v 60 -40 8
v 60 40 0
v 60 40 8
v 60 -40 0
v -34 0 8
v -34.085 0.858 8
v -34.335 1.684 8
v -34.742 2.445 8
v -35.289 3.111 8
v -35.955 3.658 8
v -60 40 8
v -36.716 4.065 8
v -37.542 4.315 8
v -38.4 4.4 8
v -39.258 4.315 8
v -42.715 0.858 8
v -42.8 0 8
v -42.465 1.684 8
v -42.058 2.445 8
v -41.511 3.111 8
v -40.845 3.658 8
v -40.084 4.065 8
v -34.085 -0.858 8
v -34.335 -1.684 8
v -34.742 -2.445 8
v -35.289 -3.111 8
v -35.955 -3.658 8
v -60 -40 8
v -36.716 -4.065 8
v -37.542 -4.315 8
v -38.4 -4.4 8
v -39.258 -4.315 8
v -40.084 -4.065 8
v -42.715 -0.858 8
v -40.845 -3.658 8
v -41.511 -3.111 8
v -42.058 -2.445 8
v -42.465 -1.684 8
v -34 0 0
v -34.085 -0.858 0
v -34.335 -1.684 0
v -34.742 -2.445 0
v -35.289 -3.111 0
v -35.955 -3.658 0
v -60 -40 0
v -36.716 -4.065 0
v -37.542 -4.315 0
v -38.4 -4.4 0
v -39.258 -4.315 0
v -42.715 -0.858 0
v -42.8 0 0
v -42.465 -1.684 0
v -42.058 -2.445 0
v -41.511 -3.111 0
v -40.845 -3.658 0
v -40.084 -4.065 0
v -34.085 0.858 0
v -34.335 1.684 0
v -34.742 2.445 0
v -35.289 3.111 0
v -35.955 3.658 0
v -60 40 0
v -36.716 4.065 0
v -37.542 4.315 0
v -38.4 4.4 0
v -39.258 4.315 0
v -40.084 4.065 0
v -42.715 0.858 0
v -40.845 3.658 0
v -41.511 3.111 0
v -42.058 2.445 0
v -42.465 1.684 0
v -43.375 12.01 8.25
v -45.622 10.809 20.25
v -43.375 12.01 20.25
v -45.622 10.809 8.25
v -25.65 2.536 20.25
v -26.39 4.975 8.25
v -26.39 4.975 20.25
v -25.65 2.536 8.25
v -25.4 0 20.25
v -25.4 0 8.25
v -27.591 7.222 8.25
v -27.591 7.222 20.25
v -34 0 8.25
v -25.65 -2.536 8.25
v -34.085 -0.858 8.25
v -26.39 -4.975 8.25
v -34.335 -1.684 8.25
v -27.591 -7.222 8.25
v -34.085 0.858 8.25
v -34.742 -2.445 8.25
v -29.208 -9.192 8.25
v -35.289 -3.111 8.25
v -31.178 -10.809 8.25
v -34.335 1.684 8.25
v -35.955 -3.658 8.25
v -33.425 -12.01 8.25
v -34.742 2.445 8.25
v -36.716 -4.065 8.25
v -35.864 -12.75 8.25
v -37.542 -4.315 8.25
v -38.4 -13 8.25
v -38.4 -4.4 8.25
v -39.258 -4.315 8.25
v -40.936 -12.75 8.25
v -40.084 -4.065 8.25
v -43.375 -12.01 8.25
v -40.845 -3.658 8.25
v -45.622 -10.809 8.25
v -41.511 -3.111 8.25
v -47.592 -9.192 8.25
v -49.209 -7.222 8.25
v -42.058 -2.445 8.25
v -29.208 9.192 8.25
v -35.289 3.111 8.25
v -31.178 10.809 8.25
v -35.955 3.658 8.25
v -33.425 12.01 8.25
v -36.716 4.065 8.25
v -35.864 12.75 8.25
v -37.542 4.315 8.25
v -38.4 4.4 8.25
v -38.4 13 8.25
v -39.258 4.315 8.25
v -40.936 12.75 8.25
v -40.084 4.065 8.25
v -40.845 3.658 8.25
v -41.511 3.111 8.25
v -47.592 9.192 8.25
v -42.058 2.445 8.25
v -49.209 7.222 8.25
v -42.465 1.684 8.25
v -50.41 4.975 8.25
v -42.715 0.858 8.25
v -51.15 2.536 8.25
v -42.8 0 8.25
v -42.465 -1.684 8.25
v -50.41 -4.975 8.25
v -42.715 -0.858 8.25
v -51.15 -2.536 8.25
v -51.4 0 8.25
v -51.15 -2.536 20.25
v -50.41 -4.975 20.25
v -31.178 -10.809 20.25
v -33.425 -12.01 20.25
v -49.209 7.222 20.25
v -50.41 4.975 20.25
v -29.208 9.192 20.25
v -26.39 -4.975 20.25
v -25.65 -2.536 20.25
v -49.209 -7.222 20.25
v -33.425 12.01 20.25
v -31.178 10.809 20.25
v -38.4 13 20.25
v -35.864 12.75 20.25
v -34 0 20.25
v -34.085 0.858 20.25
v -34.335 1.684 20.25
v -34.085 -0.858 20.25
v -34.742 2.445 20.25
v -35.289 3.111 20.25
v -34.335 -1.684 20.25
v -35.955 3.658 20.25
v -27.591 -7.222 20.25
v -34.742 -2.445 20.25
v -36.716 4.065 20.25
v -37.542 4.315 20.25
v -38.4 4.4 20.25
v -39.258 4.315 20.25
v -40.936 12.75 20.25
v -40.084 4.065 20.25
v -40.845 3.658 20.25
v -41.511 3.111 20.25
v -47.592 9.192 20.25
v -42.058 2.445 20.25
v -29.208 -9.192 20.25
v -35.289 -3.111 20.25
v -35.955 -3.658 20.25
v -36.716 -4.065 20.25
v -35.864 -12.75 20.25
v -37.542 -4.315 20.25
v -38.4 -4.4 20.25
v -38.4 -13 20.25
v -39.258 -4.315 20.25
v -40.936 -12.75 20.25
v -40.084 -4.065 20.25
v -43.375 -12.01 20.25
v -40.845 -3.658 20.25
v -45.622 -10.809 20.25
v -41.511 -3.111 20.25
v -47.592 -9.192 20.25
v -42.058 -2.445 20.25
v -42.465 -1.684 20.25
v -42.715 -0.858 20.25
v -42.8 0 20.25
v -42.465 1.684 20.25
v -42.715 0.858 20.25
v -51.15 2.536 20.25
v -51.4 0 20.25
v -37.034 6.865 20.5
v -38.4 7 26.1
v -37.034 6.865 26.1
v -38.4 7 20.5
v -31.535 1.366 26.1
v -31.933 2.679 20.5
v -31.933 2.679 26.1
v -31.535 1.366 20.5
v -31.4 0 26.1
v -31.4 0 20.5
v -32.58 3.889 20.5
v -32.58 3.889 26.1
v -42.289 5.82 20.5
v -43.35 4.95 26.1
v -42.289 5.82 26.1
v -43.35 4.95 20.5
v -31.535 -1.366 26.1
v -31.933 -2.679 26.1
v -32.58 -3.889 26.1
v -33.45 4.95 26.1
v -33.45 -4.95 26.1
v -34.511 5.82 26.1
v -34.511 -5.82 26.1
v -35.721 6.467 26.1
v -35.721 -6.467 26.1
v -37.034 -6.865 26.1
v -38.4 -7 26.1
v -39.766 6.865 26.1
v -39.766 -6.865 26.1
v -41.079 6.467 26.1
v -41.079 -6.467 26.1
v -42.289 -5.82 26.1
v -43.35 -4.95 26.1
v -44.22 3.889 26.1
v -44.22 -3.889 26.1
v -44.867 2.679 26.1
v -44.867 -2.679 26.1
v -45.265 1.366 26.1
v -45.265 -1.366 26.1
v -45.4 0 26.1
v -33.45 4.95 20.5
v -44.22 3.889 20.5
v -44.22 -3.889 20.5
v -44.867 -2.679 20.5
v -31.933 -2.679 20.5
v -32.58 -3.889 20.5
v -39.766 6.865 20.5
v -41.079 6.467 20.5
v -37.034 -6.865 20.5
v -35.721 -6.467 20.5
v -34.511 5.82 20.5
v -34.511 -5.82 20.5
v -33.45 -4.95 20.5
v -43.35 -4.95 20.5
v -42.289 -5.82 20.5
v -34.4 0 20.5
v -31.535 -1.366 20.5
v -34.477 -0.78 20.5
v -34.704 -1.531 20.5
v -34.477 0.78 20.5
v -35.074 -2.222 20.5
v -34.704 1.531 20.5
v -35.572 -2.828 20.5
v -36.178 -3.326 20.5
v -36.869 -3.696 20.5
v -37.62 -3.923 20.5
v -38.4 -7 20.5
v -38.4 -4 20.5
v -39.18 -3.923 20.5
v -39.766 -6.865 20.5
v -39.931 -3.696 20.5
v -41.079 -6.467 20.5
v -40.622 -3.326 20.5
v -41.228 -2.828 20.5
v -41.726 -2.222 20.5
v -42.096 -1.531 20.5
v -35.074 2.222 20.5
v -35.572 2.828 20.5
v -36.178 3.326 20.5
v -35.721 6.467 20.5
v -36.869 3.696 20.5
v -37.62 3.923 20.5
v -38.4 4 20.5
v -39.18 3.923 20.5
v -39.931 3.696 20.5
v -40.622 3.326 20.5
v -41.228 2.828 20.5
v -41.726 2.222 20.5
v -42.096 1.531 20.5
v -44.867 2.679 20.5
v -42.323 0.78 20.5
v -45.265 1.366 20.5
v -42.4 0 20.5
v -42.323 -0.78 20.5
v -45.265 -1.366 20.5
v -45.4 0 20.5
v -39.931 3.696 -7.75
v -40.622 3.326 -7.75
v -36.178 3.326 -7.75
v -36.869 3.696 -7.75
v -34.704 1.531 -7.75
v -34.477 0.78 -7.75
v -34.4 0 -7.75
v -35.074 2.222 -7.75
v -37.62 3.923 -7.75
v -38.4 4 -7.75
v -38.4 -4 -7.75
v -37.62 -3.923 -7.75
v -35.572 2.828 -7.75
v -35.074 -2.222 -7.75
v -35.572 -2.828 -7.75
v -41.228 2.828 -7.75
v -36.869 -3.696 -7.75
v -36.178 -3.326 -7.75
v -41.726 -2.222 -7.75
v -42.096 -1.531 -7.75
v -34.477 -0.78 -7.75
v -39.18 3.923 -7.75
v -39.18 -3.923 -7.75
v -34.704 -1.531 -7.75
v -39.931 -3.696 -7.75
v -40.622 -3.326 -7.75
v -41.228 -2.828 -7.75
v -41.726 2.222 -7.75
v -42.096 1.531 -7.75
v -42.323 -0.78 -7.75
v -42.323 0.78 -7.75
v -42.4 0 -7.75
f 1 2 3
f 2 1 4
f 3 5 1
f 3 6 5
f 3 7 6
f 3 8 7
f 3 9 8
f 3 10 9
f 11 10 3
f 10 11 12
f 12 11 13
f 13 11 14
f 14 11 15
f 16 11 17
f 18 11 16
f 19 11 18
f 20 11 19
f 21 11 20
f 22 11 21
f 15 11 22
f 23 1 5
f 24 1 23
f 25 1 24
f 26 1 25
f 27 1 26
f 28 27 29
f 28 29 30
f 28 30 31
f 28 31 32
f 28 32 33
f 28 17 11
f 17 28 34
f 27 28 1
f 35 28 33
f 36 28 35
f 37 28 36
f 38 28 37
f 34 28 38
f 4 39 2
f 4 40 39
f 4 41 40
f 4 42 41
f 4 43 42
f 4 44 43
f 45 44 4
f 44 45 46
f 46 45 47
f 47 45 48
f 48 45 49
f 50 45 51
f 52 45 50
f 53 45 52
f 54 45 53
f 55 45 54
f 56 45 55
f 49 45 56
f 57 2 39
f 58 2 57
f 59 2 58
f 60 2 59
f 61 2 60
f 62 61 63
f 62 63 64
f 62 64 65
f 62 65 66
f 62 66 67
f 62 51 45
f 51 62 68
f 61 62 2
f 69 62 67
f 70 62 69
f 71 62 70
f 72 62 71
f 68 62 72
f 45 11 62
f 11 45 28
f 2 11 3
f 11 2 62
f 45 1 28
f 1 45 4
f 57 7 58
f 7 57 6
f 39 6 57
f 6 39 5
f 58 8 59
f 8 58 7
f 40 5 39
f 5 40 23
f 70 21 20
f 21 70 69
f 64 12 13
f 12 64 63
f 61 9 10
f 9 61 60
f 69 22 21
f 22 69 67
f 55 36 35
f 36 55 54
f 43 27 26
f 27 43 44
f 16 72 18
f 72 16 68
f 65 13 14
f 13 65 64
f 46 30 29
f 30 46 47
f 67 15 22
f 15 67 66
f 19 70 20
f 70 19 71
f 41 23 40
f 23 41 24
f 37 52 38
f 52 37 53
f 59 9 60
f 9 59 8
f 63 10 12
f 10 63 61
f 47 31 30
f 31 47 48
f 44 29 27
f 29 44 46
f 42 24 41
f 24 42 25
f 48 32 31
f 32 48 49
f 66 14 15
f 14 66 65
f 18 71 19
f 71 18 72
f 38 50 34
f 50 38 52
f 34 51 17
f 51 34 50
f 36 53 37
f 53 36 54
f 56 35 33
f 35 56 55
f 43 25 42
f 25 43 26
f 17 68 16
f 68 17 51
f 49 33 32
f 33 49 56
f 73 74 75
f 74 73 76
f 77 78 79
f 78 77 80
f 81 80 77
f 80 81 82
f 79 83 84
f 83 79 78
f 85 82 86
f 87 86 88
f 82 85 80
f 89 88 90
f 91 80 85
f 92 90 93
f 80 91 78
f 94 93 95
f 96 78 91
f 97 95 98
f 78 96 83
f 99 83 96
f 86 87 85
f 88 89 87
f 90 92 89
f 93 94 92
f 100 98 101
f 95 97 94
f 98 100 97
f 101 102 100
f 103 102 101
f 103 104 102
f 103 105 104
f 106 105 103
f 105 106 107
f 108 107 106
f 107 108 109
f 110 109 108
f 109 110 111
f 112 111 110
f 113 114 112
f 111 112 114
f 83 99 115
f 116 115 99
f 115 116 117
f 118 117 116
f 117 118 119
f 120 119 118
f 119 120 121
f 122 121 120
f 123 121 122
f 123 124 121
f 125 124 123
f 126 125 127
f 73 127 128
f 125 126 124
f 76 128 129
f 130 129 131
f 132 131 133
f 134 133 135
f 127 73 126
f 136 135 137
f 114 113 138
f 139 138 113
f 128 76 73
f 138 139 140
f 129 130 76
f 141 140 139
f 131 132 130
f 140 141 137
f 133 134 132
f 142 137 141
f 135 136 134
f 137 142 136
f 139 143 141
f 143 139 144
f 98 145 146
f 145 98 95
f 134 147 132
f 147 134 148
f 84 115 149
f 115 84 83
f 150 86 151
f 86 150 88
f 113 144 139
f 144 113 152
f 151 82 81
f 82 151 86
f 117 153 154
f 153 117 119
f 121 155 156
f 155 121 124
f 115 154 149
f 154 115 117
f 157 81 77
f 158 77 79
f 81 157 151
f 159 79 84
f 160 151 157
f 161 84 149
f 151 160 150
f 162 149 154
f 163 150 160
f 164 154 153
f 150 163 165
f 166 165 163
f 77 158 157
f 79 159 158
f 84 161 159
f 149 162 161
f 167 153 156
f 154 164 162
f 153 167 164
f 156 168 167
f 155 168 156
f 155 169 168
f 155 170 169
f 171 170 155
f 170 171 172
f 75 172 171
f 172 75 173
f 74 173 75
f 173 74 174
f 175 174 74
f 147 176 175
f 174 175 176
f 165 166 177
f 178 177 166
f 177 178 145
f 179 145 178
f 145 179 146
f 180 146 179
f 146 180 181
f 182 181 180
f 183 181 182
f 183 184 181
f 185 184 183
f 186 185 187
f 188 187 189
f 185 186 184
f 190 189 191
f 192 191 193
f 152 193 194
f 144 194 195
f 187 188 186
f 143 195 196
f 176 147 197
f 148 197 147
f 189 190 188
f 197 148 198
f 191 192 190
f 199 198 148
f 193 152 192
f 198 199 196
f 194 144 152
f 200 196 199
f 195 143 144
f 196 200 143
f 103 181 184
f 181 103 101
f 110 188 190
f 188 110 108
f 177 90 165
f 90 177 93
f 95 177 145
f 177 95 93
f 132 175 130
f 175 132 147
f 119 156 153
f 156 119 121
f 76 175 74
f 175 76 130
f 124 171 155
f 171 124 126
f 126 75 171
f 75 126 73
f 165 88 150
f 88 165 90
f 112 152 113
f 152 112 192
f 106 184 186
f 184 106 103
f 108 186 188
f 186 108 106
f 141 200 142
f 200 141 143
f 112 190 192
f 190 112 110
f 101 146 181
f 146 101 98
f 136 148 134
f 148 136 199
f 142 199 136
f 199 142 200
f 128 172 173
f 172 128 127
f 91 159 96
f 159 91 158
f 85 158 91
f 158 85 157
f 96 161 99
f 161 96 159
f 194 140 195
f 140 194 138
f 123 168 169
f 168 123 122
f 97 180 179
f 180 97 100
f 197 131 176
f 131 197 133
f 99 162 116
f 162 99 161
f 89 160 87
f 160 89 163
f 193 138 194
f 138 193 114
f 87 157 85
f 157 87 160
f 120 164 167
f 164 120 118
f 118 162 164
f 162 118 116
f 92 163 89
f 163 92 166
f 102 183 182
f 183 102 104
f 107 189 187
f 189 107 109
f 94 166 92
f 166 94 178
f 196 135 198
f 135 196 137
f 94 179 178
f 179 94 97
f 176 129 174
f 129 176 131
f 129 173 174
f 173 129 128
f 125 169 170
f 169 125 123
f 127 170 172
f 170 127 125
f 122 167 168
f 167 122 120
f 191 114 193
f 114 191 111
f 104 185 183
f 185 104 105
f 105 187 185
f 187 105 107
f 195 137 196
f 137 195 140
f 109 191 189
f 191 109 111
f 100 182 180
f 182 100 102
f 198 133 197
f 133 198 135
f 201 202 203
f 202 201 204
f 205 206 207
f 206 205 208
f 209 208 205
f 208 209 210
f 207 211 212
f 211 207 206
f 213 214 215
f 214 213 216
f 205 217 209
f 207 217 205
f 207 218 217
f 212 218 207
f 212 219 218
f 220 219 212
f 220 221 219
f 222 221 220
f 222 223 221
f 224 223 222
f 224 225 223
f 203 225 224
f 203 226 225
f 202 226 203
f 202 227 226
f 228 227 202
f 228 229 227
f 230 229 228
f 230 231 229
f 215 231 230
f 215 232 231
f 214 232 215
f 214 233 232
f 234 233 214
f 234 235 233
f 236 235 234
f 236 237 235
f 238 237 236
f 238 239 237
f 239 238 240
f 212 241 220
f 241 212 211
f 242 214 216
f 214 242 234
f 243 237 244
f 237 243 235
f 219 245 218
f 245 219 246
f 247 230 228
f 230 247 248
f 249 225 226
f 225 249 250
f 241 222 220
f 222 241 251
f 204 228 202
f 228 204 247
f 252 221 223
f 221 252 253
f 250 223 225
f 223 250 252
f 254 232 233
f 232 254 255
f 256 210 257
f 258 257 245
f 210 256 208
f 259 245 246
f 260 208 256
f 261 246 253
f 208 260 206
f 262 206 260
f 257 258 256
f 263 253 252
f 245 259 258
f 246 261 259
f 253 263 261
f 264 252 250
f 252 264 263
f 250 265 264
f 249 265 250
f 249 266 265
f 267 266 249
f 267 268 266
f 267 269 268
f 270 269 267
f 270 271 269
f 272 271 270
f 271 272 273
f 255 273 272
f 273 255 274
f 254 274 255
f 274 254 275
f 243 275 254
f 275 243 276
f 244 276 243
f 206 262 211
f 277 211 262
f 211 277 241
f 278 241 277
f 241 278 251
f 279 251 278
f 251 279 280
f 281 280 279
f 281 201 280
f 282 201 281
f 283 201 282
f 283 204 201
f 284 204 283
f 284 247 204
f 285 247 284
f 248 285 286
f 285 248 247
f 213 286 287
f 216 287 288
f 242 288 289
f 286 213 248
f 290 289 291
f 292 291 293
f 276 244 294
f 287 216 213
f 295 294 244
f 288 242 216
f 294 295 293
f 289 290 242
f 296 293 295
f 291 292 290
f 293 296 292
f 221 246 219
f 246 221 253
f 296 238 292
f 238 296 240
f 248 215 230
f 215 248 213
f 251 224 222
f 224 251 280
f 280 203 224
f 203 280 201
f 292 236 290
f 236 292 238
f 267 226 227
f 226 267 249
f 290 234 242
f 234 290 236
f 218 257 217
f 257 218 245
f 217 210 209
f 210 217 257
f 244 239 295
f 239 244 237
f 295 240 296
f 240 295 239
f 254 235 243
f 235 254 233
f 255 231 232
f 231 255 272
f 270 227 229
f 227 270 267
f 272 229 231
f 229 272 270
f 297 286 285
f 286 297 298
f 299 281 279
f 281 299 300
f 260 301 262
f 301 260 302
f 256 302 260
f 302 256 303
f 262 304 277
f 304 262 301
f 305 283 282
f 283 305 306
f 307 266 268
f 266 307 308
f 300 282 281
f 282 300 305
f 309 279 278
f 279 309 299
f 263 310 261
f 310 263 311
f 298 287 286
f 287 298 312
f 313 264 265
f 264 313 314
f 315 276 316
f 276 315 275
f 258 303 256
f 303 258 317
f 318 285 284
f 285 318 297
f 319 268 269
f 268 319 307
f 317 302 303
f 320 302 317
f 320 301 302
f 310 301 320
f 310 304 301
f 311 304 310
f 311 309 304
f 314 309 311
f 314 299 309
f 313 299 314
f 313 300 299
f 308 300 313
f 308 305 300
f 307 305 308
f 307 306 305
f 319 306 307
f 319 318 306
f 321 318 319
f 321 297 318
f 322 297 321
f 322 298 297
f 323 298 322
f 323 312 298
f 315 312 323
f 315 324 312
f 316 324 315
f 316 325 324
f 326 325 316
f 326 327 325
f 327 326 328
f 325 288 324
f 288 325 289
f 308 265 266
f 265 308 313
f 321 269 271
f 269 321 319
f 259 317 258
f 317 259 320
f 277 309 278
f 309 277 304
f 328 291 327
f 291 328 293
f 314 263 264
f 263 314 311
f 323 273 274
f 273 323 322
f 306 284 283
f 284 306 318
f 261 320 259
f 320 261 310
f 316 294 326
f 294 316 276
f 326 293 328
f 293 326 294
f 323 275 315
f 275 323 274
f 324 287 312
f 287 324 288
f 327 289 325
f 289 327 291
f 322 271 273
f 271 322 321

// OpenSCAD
$fn = 32;

// ------------------------------------------------------------------------
// Standoff columns: 1 d26 standoffs, bolts d8
// Every part is its own module, assembly() places them once.
// ------------------------------------------------------------------------

// --- part 1 ---
module base_plate() {
  difference() {
    translate([-60, -40, 0]) cube([120, 80, 8]);
    translate([-38.4, 0, -1]) cylinder(h = 10, d = 8.8);
  }
}

// --- part 2 ---
module spacer() {
  difference() {
      translate([0, 0, 0]) cylinder(h = 12, d = 26);
      translate([0, 0, -1]) cylinder(h = 14, d = 8.8);
    }
}

// --- part 3 ---
module bolt() {
  cylinder(h = 5.6, d = 14);
  translate([0, 0, -28.25]) cylinder(h = 28.25, d = 8);
}

// --- assembly ---
module assembly() {
  translate([0, 0, 0]) rotate([0, 0, 0]) base_plate();
  translate([-38.4, 0, 8.25]) rotate([0, 0, 0]) spacer();
  translate([-38.4, 0, 20.5]) rotate([0, 0, 0]) bolt();
}

assembly();
